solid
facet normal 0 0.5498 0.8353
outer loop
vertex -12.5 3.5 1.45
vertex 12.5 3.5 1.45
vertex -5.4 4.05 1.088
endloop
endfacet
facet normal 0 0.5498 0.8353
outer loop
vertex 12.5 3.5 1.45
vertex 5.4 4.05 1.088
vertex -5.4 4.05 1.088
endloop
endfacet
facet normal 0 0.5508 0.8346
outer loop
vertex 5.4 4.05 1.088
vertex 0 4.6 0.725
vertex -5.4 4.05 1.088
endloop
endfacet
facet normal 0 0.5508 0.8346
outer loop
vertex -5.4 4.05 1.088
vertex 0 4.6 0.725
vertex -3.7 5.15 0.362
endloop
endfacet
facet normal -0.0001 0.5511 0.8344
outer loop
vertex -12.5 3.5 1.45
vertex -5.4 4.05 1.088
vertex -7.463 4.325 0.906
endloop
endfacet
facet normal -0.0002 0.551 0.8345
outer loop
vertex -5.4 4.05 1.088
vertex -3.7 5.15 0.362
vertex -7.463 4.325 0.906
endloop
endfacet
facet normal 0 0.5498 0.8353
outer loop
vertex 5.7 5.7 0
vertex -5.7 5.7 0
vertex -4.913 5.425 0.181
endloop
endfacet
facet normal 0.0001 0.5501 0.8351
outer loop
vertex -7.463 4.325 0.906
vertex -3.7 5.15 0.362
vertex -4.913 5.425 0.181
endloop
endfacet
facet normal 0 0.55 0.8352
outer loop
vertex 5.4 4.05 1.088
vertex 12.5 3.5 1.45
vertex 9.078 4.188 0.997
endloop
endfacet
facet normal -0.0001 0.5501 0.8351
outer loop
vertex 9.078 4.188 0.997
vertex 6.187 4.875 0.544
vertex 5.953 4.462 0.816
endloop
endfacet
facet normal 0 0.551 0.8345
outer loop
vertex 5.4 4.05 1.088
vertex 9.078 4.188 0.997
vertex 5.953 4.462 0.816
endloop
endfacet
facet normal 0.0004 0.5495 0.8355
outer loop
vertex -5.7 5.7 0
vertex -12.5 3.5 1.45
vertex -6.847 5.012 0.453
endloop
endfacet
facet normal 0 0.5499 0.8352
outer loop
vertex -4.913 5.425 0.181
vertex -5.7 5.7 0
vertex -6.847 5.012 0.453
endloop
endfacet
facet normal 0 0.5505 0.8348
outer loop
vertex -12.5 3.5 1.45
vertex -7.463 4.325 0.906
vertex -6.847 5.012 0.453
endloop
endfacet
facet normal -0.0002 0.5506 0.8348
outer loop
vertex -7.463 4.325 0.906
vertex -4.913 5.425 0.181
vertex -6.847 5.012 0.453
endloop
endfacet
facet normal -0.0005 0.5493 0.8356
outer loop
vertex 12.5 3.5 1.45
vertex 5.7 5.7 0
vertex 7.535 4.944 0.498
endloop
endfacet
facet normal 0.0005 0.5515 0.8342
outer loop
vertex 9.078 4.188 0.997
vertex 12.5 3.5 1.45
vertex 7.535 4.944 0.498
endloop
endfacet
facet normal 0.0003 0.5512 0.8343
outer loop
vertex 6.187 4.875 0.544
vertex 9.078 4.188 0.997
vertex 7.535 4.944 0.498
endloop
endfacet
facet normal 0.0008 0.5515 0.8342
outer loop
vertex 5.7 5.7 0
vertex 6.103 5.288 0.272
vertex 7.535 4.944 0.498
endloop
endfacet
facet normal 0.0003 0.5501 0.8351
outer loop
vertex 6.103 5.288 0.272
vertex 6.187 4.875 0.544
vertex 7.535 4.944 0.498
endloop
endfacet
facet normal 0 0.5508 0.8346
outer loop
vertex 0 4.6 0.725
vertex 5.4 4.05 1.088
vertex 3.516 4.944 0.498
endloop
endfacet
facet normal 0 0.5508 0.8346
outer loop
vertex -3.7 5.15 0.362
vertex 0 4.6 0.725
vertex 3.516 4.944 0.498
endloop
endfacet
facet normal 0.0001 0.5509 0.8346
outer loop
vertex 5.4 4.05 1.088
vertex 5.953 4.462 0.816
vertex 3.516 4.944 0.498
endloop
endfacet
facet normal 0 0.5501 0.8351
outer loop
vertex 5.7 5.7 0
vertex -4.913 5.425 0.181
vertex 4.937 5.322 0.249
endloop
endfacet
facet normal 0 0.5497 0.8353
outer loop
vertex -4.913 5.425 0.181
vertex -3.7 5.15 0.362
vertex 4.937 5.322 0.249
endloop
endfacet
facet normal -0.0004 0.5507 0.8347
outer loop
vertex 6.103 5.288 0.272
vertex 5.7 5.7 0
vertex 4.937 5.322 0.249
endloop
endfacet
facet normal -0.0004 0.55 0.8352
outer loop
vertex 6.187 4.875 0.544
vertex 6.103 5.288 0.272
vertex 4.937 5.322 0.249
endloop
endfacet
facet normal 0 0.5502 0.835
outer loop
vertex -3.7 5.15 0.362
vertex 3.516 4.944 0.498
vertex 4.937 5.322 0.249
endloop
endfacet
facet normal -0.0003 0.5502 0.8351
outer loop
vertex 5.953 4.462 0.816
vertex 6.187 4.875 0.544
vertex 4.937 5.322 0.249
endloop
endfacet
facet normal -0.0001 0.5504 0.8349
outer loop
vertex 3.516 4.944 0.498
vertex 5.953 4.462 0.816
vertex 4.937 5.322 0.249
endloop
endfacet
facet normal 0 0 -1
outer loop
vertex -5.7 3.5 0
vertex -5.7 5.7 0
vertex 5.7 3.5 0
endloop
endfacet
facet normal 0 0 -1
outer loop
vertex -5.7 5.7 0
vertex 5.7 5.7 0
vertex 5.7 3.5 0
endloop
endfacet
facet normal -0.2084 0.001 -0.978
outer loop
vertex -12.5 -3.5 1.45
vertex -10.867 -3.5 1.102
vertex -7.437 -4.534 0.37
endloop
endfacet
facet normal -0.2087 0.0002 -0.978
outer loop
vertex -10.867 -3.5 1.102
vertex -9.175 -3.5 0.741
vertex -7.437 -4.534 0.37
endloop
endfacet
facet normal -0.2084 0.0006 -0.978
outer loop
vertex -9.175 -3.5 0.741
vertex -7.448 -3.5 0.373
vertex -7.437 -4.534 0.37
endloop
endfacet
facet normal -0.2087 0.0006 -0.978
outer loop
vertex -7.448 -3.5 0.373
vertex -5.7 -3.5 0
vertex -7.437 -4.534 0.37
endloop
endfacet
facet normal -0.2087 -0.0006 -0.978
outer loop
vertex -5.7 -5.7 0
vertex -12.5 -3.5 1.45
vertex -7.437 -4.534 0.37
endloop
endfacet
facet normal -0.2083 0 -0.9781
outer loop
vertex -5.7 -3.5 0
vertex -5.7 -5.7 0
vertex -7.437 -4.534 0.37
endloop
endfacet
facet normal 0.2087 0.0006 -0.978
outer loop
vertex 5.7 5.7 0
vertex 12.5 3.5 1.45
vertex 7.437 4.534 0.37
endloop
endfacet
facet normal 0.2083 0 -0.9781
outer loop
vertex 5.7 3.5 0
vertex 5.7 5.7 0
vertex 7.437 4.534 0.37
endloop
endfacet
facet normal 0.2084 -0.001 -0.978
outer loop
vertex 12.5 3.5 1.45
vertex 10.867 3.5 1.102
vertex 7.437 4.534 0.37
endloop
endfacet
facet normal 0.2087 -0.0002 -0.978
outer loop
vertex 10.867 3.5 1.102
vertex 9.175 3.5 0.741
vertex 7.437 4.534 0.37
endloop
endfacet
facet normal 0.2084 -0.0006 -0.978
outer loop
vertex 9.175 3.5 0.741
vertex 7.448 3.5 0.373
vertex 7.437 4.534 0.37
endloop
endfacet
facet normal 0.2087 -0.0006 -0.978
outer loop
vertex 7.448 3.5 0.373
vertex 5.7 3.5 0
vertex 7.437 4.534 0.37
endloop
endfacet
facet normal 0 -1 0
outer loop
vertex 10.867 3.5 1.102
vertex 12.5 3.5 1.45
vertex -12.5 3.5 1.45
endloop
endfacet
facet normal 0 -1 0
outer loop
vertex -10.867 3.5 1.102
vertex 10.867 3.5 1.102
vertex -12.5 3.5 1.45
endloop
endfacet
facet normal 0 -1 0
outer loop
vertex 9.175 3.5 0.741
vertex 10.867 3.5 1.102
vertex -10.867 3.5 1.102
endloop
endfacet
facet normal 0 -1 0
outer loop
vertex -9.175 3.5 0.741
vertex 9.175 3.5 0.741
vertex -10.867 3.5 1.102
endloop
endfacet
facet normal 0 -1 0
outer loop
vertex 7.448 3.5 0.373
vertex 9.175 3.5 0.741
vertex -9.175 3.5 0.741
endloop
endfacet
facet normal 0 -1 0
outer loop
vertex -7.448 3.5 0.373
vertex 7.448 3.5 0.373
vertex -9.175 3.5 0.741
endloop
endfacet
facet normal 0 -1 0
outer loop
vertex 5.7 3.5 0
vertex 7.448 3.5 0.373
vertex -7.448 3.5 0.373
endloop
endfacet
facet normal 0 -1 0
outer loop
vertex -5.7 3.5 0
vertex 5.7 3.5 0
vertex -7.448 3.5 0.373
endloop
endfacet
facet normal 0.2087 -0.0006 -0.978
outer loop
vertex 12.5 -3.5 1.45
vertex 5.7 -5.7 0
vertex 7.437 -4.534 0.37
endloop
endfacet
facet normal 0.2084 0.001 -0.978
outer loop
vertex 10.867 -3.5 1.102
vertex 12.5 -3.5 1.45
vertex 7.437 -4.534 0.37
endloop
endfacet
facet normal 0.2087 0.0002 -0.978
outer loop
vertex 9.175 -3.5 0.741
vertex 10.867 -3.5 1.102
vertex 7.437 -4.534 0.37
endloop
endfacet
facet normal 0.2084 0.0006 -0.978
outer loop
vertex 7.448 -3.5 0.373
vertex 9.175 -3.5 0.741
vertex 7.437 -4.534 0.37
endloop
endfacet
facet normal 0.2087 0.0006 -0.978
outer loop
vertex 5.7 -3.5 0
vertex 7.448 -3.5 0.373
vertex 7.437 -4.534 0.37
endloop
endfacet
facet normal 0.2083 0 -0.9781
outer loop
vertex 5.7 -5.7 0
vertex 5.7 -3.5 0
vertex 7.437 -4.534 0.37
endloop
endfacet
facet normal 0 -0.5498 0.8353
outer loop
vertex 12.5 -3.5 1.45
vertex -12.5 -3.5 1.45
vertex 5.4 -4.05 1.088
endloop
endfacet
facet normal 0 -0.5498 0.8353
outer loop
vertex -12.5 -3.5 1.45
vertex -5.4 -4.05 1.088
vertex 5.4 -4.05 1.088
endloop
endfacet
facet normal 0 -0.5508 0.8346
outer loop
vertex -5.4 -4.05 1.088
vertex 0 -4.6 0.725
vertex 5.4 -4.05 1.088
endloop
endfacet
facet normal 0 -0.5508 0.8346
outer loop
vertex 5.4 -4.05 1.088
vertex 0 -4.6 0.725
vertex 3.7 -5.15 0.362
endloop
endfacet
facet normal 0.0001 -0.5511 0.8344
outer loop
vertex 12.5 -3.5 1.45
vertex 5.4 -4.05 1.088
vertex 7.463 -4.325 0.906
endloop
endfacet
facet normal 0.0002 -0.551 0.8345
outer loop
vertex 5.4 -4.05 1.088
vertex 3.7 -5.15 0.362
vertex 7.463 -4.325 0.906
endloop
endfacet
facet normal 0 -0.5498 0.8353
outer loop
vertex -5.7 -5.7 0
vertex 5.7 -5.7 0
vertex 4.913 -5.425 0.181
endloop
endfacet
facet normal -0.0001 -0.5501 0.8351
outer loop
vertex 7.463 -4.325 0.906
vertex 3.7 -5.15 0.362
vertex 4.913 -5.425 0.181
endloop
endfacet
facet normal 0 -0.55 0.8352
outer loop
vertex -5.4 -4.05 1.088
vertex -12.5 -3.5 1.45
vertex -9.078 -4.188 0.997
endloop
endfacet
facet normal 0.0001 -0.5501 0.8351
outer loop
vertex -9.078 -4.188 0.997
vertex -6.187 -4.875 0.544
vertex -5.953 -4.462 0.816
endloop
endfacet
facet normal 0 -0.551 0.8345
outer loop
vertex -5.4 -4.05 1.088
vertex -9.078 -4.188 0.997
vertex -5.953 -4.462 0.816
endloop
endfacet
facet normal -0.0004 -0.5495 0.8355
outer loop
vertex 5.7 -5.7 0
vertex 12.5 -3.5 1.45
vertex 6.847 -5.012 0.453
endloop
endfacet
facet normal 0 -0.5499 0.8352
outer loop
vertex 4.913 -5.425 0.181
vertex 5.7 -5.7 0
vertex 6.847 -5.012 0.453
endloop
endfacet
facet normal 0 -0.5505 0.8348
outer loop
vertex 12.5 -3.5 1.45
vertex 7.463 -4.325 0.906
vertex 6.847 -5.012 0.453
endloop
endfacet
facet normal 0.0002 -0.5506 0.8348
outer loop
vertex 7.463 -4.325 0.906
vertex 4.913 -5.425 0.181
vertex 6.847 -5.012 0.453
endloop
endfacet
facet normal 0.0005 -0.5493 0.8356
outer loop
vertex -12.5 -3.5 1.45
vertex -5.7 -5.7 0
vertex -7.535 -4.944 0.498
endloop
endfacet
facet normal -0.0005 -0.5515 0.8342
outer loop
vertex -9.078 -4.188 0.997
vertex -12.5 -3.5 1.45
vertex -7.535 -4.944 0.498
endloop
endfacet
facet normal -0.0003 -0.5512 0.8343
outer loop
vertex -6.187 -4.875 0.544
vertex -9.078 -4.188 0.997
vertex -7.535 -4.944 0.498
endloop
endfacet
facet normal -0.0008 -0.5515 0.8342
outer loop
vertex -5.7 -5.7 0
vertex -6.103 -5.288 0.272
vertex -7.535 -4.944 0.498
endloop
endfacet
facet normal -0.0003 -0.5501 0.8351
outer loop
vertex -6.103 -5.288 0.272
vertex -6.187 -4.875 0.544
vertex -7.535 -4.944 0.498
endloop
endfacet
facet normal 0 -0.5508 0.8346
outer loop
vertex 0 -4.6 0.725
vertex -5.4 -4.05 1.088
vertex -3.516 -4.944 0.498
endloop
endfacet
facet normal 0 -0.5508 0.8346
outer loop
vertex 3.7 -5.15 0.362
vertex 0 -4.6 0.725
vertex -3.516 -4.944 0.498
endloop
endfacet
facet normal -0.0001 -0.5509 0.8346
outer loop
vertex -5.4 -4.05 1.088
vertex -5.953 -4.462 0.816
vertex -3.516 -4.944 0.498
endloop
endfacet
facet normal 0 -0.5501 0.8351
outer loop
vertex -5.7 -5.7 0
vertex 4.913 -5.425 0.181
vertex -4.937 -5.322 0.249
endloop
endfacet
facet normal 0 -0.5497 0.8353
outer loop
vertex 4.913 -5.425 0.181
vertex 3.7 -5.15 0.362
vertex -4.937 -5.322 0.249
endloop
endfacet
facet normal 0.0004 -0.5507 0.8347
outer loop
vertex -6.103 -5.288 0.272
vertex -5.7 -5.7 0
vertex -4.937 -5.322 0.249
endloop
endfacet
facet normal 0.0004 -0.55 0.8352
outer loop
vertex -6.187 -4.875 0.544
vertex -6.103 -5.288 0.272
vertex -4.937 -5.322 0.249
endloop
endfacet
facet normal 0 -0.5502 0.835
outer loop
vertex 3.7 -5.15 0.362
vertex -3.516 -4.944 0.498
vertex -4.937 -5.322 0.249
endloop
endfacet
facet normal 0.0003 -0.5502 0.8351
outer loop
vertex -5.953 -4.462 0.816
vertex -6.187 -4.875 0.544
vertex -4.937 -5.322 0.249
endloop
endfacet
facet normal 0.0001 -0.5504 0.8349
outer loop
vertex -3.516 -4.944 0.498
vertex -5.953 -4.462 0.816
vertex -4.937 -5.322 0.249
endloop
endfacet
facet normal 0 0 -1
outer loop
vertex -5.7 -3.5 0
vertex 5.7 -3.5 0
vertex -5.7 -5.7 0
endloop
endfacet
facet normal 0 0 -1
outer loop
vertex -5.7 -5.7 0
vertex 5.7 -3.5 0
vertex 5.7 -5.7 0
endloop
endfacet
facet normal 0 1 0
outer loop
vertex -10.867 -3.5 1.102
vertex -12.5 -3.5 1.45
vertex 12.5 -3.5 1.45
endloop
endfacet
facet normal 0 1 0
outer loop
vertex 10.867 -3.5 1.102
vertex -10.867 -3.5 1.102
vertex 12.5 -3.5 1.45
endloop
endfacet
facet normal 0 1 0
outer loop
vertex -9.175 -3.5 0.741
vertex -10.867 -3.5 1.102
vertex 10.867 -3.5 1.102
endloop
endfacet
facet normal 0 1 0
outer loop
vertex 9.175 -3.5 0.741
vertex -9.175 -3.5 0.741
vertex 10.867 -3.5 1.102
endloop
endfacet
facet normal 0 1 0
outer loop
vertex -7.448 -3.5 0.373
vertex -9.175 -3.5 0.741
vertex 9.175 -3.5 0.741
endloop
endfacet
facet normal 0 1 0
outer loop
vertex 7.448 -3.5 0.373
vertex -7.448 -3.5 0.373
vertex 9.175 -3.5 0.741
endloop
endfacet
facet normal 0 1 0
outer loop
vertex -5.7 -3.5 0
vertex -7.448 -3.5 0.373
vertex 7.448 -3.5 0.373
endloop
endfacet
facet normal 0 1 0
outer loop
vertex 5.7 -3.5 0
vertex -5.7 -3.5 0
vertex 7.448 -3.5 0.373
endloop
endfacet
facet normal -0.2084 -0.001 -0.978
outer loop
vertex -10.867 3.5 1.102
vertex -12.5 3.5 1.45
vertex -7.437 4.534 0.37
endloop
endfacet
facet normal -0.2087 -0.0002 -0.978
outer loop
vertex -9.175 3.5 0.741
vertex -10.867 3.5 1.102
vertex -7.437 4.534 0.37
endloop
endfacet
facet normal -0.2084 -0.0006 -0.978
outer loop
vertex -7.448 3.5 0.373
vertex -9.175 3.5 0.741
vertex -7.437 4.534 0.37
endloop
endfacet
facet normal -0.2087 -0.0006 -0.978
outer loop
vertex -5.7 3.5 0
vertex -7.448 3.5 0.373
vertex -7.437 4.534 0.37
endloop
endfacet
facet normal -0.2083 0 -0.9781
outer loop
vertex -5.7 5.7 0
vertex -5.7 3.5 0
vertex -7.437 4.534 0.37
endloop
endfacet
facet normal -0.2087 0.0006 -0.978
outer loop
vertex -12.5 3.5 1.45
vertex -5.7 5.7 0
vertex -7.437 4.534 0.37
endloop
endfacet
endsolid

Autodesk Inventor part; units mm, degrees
ref_plane "YZ Plane" through (0, 0, 0) normal (1, 0, 0) x (0, 1, 0)
ref_plane "XZ Plane" through (0, 0, 0) normal (0, 1, 0) x (-1, 0, 0)
sketch "Sketch1" plane through (0, 0, 0) normal (0, 0, 1) x (1, 0, 0)
  line L0 (-5.7, 5.7) -> (5.7, 5.7) projected
  line L1 (-5.7, -5.7) -> (-5.7, 5.7) projected
  line L2 (5.7, -5.7) -> (-5.7, -5.7) projected
  line L3 (5.7, 5.7) -> (5.7, -5.7) projected
  point P0 (0, 0)
ref_plane "Work Plane1" through (0, 0, 1.45) normal (0, 0, 1) x (1, 0, 0)
sketch "Sketch2" plane through (0, 0, 1.45) normal (0, 0, 1) x (1, 0, 0)
  line L0 (12.5, 3.5) -> (-12.5, 3.5) projected
  line L1 (-12.5, 3.5) -> (-12.5, -3.5) projected
  line L2 (-12.5, -3.5) -> (12.5, -3.5) projected
  line L3 (12.5, -3.5) -> (12.5, 3.5) projected
  point P0 (0, 0)
loft "Loft1" add profiles "Sketch2", "Sketch1"
sketch "Sketch3" plane through (-12.5, 3.5, 1.45) normal (0, 0, 1) x (1, 0, 0)
  line L0 (0, 0) -> (0, -7) projected
  line L1 (25, 0) -> (0, 0) projected
  line L2 (25, -7) -> (25, 0) projected
  line L3 (0, -7) -> (25, -7) projected
  point P0 (12.5, -3.5)
extrude "Extrusion1" cut sketch "Sketch3" against normal through all
properties part number "edgeCoating" material "Rubber"
